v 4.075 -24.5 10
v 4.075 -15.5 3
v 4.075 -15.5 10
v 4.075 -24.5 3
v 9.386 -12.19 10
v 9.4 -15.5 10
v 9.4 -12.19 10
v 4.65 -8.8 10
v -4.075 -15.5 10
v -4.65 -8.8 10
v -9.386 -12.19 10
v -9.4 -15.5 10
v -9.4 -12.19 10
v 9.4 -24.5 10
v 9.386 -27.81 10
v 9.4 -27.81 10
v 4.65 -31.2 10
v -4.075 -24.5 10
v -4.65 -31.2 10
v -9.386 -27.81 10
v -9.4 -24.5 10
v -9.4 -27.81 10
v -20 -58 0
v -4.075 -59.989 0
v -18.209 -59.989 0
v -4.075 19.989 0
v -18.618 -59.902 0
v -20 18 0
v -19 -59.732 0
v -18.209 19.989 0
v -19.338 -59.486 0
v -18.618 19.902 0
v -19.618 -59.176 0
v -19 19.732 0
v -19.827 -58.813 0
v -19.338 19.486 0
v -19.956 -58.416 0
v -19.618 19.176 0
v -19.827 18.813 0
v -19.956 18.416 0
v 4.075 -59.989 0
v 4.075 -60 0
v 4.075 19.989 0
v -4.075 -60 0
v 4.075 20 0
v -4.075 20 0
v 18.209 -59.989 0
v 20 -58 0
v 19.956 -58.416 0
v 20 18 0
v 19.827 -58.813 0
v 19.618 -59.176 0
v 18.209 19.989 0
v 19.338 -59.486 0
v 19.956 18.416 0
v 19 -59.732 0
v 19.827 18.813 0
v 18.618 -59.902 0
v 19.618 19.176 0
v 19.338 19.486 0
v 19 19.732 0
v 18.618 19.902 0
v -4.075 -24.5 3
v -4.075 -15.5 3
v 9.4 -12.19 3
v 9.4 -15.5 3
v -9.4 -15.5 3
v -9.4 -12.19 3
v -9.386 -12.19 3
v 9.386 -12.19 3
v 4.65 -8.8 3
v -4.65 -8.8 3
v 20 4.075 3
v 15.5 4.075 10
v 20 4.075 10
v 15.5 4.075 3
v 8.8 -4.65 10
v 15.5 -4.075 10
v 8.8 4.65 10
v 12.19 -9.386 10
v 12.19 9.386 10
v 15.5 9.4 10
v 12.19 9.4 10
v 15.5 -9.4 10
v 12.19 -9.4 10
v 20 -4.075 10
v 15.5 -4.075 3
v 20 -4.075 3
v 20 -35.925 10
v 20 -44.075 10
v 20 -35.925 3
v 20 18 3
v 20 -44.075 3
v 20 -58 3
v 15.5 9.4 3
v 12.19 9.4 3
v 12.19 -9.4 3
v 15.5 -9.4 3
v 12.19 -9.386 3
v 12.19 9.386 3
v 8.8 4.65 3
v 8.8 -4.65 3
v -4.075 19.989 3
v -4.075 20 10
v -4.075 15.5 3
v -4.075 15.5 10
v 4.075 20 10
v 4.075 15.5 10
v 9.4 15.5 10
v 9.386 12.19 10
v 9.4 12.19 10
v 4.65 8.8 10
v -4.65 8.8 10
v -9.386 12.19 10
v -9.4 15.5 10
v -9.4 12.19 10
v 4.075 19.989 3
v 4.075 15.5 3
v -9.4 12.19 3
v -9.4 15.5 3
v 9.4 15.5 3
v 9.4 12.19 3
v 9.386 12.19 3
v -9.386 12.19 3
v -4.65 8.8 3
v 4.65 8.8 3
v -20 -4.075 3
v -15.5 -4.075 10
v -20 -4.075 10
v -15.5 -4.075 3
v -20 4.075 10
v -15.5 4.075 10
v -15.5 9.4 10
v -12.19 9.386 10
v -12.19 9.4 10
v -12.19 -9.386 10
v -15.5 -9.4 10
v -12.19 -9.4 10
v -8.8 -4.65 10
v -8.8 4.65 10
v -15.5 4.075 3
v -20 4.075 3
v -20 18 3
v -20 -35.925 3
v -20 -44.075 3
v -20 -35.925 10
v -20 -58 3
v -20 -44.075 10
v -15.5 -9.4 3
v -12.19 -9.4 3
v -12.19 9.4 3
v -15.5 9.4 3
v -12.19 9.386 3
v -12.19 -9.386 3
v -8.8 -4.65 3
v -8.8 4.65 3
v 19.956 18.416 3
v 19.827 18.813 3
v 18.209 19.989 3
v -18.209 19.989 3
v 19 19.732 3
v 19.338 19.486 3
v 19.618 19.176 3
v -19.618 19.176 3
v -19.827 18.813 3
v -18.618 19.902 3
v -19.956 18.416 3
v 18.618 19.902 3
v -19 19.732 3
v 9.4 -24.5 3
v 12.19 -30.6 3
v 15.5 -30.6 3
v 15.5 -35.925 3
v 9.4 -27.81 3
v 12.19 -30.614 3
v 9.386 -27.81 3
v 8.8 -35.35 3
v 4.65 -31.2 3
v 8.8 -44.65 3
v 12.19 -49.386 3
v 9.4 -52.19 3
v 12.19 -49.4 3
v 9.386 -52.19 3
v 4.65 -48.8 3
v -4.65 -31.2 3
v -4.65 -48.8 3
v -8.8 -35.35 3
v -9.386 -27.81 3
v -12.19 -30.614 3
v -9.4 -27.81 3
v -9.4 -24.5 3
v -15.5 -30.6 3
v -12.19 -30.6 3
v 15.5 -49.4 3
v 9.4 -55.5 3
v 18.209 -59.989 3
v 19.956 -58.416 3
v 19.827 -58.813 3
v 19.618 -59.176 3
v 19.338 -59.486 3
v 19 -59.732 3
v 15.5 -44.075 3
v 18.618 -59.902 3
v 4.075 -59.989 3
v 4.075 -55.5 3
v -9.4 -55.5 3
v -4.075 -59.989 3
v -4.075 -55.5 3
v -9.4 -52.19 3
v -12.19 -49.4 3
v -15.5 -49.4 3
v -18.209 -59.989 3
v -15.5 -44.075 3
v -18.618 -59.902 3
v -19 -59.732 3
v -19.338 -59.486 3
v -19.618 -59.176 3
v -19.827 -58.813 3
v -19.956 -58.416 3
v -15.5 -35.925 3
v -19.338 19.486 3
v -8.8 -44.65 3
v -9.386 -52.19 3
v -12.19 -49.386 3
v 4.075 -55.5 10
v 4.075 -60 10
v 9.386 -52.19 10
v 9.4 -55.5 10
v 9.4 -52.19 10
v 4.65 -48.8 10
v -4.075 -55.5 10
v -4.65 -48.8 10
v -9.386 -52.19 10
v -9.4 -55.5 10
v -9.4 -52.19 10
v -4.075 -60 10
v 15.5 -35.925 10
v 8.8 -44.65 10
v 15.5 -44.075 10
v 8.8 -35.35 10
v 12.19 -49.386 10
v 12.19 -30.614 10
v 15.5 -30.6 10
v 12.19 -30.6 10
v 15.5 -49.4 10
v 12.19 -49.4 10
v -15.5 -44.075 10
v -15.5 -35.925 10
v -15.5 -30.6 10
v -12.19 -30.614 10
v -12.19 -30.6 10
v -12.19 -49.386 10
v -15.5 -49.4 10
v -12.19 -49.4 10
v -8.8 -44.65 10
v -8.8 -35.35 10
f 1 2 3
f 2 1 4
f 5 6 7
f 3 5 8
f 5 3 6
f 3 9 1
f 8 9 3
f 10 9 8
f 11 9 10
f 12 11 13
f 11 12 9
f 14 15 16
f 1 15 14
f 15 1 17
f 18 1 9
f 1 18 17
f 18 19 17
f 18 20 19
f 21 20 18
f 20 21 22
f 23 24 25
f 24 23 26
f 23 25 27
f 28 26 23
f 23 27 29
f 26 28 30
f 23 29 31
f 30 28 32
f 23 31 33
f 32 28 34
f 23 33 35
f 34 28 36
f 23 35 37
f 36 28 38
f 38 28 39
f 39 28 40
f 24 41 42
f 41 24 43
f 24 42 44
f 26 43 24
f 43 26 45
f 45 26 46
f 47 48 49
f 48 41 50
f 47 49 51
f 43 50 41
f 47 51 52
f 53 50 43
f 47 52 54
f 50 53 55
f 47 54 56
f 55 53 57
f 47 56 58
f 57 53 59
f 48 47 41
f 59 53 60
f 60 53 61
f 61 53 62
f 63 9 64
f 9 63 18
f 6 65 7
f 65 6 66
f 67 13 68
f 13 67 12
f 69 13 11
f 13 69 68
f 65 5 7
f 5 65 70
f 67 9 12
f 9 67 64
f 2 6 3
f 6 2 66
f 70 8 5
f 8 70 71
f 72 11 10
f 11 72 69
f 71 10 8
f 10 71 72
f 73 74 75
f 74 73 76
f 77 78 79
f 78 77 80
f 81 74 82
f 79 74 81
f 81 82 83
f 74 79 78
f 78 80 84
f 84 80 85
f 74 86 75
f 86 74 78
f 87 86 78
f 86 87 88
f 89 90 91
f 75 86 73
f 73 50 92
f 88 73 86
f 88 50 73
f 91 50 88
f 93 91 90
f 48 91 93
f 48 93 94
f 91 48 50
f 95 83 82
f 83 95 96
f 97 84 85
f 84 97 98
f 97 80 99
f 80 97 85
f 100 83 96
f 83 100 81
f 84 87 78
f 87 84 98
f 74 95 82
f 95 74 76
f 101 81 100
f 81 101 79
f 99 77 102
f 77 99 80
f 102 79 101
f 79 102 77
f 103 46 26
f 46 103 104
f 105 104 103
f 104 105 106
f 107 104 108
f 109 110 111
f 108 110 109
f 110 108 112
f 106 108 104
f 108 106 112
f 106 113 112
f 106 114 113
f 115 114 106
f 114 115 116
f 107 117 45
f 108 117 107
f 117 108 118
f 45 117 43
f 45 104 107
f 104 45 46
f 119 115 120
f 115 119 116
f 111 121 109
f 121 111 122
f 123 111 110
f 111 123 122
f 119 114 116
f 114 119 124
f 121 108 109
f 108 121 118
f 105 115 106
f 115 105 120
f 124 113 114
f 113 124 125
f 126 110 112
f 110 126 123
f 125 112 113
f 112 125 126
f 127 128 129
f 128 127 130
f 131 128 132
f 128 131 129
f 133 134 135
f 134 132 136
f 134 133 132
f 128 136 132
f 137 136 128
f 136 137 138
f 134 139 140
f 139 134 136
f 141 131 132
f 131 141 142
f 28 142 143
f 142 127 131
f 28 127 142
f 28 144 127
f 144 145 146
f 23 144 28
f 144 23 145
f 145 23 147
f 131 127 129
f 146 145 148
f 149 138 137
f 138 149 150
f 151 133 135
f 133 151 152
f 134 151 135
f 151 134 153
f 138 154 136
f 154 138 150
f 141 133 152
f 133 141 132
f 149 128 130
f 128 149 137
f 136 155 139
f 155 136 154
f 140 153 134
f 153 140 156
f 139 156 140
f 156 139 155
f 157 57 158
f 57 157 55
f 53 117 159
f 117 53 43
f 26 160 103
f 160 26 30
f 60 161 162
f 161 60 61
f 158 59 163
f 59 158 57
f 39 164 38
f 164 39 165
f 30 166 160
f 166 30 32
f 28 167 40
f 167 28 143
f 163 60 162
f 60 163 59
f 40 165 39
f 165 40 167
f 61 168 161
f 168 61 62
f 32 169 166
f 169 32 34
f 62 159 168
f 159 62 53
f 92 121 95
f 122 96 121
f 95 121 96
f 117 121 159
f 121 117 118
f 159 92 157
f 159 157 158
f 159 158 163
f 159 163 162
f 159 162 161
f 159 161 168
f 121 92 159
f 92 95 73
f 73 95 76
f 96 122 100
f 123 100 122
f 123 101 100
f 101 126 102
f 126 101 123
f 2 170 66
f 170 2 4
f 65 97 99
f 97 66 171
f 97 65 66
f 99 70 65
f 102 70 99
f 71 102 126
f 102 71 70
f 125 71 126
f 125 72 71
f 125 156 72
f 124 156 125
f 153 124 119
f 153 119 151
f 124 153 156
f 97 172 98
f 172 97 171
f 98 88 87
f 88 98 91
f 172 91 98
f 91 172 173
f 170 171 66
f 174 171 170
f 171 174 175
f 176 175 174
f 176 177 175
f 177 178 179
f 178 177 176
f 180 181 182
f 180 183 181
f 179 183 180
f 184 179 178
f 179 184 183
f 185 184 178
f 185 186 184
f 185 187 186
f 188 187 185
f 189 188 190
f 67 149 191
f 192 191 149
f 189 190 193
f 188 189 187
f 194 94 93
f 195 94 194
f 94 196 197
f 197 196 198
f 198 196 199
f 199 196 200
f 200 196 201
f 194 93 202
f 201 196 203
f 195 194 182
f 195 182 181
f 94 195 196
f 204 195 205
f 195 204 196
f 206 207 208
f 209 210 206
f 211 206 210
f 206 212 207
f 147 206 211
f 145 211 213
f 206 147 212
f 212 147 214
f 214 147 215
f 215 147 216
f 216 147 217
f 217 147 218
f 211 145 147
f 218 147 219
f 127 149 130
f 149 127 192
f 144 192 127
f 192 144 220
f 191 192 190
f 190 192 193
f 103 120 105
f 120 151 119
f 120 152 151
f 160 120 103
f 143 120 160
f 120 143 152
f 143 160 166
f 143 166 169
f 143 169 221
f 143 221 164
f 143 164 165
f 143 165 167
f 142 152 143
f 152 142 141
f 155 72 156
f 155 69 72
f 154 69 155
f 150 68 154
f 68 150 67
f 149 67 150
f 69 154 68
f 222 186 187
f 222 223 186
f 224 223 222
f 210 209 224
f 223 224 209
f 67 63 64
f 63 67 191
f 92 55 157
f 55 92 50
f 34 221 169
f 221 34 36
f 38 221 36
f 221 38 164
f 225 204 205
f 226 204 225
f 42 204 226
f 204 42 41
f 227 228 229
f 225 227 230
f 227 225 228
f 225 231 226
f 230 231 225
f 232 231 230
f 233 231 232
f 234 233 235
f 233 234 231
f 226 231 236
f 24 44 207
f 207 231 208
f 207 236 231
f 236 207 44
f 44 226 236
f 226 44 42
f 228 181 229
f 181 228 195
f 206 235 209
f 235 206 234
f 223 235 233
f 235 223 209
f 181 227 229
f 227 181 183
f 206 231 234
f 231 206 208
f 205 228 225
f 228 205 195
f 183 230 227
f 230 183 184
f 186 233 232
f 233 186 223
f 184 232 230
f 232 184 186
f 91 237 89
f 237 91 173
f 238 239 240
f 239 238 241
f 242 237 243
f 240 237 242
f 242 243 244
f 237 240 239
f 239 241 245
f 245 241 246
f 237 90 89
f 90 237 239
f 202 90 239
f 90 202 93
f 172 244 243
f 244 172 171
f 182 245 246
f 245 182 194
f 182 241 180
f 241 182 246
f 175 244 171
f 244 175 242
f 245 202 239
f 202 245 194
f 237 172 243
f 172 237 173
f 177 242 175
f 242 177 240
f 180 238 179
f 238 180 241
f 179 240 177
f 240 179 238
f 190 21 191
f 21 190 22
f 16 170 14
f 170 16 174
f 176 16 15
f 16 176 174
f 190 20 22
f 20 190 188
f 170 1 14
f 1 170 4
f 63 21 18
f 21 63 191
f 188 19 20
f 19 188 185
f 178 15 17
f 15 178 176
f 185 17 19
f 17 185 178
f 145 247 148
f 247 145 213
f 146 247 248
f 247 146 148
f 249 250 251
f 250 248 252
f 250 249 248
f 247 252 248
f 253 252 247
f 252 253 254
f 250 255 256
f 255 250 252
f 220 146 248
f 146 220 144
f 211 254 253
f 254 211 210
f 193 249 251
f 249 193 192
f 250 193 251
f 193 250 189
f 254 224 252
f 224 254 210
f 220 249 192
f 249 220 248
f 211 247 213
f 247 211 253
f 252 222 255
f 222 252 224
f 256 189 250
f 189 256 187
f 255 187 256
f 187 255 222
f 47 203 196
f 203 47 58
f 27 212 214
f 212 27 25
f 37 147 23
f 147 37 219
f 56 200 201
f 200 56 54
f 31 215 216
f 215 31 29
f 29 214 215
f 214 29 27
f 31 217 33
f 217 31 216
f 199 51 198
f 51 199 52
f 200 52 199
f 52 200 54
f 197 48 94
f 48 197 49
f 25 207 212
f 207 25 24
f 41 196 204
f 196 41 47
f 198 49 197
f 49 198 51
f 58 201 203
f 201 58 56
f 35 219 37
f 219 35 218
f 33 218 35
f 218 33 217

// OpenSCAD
// Improved Extrusion End Cap
// Original by jag
// Modified by Bill Gertz (billgertz) on 31 August 2015
// Version 0.6.4
//
// Fixed:
// 0.5     billgertz   Modified code to create double (2n x n) end caps with no, one or two holes
//                     Modified tab height to clarify length as a seperate tab
// 0.6.3   billgertz   Modified and corrected for customizer
// 0.6.4   billgertz   Added work around Customizer bug by renaming [Global] to [General] tab
//
// Improved Extrusion End Cap by billgertz is licensed under a Creative Commons Attribution-ShareAlike 4.0 International License.
// Based on a work at http://www.thingiverse.com/thing:43756 
// All measurements are in mm
//

/* [General] */
// set to print a double wide cap e.g. 40x80
double_wide_cap="yes";       // [yes,no]

// set holes, but for:
//       double wide (double_wide_cap=true): > 2 generates only two holes
//       single wide (double_wide_cap=false): > 1 generates one hole
//       either: < 0 generates no holes

// number of holes //
holes=0;                     // [0:none,1:one,2:two]

/* [T Slot Base] */
// width of exterior slot at T base (mm)
slot_width=8.35;             // 
// wall thckness of extrusion at T base (mm)
slot_thickness=4.5;          // 

/* [T Slot Crossbar] */
// length of T crossbar (mm)
t_width=19.0;                // 
// depth of crossbar before taper (mm)
t_depth=3.5;                 // 

/* [T Slot Crossbar Taper] */
// most T slot excrusion narrows at top of T crossbar this is modeled with a trapazoid

// bottom of taper use T Width (mm)
trapezoid_bottom_width=19.0; // 
// top of taper (mm)
trapezoid_top_width=9.5;     // 
// taper width (mm)
trapezoid_depth=3.6;         // 

/* [End Cap] */
// extrusion size (mm)
extrusion_size=40;           // [10,15,20,25,30,40,50]
// end cap thickness (mm)
end_cap_thickness=3;         // [2:10]
// corner rounding radius (mm)
corner_rounding=2;           // [2:5]
// hole diameter (mm)
hole_size=7.7;               // 
// length of tabs that fit into each T slot (mm)
tab_height=7;                //  
// trim for good fit (mm)
undersize=0.2;		         // 

if (double_wide_cap == "yes") {
    union() {
        translate([0,-extrusion_size,0])
        
            if (holes > 1) {
                end_cap_with_hole();
            } else {
                end_cap();
            }
            
        if (holes > 0) {
               end_cap_with_hole();
        } else {
               end_cap();
        }
        
        patch();
        
    }
    
} else {
    if (holes > 0) {
        end_cap_with_hole();
    } else {
        end_cap();
    }
}

module end_cap_with_hole() {
    difference() {
        end_cap();
        cylinder(r=hole_size/2, h=end_cap_thickness*4, center=true, $fn=30);
    }   
}

module end_cap() {
    union() {
        
        for (a=[0:3])
            rotate([0,0,90*a])
                translate([0,-extrusion_size/2,0])
                    t_slot();
		
        translate([-extrusion_size/2+corner_rounding, -extrusion_size/2+corner_rounding,0])
            minkowski() {
                cube([extrusion_size-corner_rounding*2,extrusion_size-corner_rounding*2,end_cap_thickness-1]);
                cylinder(r=corner_rounding, h=1, $fn=30);
            }
            
    }
    
}

module t_slot() {
	translate([-slot_width/2+undersize/2,0,0])
		cube([slot_width-undersize, slot_thickness+t_depth, tab_height+end_cap_thickness]);
	translate([-t_width/2+undersize/2,slot_thickness,0])
		cube([t_width-undersize,t_depth-undersize+0.01,tab_height+end_cap_thickness]);
	translate([0,slot_thickness+t_depth-undersize,0])
		linear_extrude(height=tab_height+end_cap_thickness)
			trapezoid(bottom=trapezoid_bottom_width-undersize, top=trapezoid_top_width-undersize, height=trapezoid_depth-undersize);
}


module trapezoid(bottom=10, top=5, height=2) {
	polygon(points=[[-bottom/2,0],[bottom/2,0],[top/2,height],[-top/2,height]]);
}

module patch() {
    translate([-extrusion_size/2,-extrusion_size/2-corner_rounding,0])  // create patch for rounded corners at join
        cube([extrusion_size,corner_rounding*2,end_cap_thickness]);
}
